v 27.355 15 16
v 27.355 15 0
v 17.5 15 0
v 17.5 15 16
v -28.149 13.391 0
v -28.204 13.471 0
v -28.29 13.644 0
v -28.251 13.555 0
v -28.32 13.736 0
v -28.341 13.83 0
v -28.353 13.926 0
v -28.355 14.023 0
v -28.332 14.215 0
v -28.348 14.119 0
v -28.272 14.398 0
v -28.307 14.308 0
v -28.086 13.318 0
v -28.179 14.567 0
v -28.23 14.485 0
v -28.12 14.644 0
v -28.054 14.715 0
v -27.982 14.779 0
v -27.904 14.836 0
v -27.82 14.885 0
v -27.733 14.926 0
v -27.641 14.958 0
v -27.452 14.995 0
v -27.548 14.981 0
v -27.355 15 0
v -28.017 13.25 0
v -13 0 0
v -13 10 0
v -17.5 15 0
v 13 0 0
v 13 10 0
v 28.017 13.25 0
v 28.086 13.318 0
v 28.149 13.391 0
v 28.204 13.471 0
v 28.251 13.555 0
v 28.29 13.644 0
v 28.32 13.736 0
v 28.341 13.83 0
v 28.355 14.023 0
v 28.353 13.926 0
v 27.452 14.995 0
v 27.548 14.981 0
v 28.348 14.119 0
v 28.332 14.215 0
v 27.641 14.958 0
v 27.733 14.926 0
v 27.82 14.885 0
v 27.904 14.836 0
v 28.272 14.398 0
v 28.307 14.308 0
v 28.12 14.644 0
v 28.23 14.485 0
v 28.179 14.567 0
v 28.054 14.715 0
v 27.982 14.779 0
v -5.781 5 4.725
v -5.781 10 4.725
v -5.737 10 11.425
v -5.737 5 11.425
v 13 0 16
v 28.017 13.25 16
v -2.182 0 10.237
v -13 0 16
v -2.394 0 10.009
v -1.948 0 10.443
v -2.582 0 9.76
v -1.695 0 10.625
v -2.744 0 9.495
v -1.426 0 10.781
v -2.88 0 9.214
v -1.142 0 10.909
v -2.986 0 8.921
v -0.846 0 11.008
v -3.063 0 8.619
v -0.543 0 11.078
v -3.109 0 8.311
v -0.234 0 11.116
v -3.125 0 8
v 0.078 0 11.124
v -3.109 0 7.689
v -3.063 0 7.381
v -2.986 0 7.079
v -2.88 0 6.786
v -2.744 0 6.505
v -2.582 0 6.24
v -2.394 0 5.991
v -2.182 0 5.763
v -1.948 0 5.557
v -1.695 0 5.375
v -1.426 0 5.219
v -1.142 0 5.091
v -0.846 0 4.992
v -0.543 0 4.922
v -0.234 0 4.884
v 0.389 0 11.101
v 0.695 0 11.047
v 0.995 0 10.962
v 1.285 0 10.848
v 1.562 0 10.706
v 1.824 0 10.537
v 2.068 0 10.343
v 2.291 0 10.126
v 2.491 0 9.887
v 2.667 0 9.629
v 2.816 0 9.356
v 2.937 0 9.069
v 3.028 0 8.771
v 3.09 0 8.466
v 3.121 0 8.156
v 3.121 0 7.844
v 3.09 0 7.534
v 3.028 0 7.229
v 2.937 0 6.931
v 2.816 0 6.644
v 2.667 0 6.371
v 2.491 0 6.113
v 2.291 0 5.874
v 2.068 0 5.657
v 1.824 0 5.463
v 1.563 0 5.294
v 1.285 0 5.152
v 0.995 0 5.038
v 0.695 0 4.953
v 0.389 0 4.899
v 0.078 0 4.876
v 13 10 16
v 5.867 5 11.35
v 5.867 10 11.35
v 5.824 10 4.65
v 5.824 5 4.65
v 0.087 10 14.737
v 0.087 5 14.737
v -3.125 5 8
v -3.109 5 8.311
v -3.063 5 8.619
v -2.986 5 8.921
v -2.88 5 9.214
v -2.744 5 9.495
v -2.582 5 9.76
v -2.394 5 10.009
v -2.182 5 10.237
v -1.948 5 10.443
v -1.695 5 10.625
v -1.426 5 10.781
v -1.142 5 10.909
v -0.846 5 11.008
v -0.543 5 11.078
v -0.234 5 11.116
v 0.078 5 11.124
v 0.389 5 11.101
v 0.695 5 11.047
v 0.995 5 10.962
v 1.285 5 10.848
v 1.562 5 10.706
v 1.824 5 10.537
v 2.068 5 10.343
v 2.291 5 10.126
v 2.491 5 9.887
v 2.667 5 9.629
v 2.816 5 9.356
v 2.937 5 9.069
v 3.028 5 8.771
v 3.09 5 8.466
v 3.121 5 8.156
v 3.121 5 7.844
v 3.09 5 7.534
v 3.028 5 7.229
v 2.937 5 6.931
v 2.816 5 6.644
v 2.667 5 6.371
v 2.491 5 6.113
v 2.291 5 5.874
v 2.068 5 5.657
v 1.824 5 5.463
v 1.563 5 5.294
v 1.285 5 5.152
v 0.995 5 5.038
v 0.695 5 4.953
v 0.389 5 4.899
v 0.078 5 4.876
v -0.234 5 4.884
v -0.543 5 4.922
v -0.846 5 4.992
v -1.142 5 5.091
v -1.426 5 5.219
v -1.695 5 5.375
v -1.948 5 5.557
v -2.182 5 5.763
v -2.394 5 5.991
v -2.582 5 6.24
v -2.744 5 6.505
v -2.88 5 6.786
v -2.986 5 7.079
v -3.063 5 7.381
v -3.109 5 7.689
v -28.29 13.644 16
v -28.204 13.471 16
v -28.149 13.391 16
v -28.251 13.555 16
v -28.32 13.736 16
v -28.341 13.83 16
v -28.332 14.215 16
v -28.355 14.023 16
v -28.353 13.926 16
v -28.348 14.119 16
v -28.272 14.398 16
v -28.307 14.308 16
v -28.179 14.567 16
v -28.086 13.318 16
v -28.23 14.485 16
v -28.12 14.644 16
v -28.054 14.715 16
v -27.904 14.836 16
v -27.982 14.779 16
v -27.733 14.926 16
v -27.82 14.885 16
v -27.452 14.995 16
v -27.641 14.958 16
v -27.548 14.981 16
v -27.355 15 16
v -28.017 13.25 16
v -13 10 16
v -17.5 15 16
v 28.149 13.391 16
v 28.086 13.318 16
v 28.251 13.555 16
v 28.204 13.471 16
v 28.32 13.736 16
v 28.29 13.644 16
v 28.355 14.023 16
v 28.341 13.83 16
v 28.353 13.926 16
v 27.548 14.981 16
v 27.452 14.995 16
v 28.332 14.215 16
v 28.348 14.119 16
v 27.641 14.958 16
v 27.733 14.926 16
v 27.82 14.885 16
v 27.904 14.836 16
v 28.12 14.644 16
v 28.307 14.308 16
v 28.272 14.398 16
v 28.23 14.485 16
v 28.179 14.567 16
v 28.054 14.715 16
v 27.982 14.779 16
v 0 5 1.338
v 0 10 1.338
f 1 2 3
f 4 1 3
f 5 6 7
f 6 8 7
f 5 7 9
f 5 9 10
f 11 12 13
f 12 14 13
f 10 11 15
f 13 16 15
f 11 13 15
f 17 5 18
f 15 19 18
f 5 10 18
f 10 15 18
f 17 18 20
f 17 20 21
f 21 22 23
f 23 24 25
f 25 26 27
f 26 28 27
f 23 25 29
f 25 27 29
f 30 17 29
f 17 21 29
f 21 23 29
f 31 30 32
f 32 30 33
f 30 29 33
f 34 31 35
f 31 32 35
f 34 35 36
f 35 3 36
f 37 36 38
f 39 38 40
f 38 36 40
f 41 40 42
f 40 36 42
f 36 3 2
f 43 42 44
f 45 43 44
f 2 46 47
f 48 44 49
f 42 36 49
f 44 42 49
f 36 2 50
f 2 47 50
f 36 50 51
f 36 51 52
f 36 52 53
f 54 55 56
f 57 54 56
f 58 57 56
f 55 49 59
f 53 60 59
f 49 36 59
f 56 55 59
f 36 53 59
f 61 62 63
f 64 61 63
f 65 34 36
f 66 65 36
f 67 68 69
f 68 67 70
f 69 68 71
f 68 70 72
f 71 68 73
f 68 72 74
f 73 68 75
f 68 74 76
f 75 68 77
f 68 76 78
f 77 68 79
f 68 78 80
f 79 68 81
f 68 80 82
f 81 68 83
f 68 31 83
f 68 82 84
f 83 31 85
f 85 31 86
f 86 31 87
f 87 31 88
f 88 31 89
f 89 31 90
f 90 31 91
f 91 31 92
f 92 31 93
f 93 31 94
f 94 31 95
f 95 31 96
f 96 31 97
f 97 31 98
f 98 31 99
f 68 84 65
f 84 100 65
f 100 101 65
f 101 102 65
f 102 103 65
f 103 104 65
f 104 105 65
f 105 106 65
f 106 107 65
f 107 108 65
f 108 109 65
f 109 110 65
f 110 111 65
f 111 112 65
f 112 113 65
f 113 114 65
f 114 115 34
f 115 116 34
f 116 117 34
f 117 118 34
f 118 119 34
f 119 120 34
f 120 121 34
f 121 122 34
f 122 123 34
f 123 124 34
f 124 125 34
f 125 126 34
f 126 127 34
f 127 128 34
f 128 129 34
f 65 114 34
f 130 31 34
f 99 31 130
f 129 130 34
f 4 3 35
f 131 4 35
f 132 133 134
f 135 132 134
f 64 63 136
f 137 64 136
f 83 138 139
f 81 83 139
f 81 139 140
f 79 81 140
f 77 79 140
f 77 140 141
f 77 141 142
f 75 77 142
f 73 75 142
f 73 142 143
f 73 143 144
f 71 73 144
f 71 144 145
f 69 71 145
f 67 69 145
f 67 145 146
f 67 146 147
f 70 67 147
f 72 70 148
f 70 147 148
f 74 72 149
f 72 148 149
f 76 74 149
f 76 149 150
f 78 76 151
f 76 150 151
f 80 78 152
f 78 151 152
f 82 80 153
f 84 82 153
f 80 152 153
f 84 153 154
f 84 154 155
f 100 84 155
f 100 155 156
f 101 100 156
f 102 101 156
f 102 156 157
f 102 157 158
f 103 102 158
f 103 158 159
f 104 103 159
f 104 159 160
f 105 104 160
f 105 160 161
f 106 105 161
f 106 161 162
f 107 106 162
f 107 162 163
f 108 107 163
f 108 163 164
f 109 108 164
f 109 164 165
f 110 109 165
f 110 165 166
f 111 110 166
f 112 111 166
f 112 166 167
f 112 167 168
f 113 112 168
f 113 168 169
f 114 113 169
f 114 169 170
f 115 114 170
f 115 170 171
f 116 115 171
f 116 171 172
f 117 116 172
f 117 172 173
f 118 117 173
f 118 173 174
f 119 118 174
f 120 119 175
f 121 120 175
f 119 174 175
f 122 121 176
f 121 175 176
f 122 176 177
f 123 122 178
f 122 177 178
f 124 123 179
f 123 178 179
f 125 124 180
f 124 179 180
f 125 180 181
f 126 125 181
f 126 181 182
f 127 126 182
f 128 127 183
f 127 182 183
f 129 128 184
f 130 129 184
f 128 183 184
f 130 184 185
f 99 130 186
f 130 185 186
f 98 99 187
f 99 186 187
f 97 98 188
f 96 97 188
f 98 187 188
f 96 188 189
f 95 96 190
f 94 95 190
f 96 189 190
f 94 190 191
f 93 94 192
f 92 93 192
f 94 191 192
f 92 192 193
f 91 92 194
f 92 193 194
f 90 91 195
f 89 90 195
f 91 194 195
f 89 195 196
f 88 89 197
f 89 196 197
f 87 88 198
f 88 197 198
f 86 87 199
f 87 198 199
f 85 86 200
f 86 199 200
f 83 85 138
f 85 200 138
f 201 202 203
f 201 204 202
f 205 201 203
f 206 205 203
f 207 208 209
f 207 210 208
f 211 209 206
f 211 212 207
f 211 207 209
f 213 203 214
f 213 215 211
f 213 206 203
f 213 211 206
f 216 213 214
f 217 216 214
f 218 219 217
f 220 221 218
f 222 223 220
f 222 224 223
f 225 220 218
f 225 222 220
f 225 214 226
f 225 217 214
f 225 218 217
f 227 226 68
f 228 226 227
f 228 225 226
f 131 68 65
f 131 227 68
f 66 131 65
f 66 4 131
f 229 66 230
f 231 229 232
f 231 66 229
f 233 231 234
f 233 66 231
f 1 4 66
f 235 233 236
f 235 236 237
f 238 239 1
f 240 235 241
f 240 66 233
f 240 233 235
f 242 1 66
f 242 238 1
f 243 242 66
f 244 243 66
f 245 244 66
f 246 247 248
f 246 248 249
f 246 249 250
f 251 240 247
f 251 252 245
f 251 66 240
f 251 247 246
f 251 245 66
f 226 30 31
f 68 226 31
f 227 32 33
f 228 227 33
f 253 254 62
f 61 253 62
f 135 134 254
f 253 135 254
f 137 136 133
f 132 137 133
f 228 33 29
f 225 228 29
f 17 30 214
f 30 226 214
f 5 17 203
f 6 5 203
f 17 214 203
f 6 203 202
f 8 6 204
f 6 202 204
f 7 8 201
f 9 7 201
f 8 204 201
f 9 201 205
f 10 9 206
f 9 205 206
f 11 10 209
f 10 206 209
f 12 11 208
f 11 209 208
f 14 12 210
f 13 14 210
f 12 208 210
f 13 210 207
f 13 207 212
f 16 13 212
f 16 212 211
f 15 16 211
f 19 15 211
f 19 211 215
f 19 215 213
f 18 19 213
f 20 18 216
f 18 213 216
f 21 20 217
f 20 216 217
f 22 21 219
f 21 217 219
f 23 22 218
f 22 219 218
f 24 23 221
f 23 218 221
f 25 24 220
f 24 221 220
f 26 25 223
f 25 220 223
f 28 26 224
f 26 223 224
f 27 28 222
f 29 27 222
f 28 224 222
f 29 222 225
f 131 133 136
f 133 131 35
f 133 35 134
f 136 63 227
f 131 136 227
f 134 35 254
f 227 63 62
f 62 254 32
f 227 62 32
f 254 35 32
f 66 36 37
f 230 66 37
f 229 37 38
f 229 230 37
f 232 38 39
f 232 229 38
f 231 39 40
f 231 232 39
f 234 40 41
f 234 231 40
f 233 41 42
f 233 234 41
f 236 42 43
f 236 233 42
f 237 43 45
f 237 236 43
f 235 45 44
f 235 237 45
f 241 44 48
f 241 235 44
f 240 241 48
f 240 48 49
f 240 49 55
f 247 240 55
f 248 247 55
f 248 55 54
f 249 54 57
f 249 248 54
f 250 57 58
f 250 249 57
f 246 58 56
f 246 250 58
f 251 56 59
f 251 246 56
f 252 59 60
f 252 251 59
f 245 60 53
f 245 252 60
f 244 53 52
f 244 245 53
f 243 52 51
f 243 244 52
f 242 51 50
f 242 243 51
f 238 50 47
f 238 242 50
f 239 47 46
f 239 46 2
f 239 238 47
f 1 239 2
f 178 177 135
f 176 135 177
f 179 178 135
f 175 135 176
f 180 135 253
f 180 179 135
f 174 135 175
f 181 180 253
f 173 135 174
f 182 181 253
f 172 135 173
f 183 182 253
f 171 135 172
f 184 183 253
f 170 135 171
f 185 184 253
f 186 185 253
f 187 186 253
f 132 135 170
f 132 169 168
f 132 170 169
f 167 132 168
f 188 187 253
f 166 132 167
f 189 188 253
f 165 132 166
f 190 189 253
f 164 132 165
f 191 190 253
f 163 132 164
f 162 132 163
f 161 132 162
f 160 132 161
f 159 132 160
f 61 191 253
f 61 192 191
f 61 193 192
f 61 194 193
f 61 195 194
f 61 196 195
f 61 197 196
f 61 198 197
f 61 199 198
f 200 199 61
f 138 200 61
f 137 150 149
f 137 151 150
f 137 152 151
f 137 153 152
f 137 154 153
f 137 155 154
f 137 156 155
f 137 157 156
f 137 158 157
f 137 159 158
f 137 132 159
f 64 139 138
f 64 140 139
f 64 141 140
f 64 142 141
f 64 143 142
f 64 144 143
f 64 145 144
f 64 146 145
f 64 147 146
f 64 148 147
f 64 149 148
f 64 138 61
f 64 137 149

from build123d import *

# Parameters (mm, degrees)
F1_DEPTH = 16
F2_R     = 3.125
F3_DEPTH = 10
F4_DEPTH = 5
F5_R     = 1
F6_R     = 1


with BuildPart() as f1:
    # F0 (on Top) → F1 (new body)
    with BuildSketch(Plane.XY):
        Polygon((-17.5, 15), (-30, 15), (-13, 0), (0, 0), (13, 0), (30, 15), (17.5, 15), (13, 10), (0, 10), (-13, 10), align=None)
    extrude(amount=F1_DEPTH)

    # F2 (on face) → F3 (cut, through all)
    with BuildSketch(Plane(origin=(0, 10, 0), x_dir=(-1, 0, 0), z_dir=(0, 1, 0))):
        with Locations((0, 8)):
            Circle(F2_R)
    extrude(amount=-F3_DEPTH, mode=Mode.SUBTRACT)

    # F2 (on face) → F4 (cut)
    with BuildSketch(Plane(origin=(0, 10, 0), x_dir=(-1, 0, 0), z_dir=(0, 1, 0))):
        Polygon((-5.86727, 11.34993), (-5.823923, 4.65007), (0, 1.33768), (5.780575, 4.72515), (5.737227, 11.42501), (-0.086695, 14.7374), align=None)
        with Locations((0, 8)):
            Circle(F2_R, mode=Mode.SUBTRACT)
    extrude(amount=-F4_DEPTH, mode=Mode.SUBTRACT)

    # F5
    f5_edges = [f1.edges().sort_by_distance(p)[0] for p in [
        (30, 15, 8),
    ]]
    fillet(f5_edges, radius=F5_R)

    # F6
    f6_edges = [f1.edges().sort_by_distance(p)[0] for p in [
        (-30, 15, 8),
    ]]
    fillet(f6_edges, radius=F6_R)


solid = f1.part
